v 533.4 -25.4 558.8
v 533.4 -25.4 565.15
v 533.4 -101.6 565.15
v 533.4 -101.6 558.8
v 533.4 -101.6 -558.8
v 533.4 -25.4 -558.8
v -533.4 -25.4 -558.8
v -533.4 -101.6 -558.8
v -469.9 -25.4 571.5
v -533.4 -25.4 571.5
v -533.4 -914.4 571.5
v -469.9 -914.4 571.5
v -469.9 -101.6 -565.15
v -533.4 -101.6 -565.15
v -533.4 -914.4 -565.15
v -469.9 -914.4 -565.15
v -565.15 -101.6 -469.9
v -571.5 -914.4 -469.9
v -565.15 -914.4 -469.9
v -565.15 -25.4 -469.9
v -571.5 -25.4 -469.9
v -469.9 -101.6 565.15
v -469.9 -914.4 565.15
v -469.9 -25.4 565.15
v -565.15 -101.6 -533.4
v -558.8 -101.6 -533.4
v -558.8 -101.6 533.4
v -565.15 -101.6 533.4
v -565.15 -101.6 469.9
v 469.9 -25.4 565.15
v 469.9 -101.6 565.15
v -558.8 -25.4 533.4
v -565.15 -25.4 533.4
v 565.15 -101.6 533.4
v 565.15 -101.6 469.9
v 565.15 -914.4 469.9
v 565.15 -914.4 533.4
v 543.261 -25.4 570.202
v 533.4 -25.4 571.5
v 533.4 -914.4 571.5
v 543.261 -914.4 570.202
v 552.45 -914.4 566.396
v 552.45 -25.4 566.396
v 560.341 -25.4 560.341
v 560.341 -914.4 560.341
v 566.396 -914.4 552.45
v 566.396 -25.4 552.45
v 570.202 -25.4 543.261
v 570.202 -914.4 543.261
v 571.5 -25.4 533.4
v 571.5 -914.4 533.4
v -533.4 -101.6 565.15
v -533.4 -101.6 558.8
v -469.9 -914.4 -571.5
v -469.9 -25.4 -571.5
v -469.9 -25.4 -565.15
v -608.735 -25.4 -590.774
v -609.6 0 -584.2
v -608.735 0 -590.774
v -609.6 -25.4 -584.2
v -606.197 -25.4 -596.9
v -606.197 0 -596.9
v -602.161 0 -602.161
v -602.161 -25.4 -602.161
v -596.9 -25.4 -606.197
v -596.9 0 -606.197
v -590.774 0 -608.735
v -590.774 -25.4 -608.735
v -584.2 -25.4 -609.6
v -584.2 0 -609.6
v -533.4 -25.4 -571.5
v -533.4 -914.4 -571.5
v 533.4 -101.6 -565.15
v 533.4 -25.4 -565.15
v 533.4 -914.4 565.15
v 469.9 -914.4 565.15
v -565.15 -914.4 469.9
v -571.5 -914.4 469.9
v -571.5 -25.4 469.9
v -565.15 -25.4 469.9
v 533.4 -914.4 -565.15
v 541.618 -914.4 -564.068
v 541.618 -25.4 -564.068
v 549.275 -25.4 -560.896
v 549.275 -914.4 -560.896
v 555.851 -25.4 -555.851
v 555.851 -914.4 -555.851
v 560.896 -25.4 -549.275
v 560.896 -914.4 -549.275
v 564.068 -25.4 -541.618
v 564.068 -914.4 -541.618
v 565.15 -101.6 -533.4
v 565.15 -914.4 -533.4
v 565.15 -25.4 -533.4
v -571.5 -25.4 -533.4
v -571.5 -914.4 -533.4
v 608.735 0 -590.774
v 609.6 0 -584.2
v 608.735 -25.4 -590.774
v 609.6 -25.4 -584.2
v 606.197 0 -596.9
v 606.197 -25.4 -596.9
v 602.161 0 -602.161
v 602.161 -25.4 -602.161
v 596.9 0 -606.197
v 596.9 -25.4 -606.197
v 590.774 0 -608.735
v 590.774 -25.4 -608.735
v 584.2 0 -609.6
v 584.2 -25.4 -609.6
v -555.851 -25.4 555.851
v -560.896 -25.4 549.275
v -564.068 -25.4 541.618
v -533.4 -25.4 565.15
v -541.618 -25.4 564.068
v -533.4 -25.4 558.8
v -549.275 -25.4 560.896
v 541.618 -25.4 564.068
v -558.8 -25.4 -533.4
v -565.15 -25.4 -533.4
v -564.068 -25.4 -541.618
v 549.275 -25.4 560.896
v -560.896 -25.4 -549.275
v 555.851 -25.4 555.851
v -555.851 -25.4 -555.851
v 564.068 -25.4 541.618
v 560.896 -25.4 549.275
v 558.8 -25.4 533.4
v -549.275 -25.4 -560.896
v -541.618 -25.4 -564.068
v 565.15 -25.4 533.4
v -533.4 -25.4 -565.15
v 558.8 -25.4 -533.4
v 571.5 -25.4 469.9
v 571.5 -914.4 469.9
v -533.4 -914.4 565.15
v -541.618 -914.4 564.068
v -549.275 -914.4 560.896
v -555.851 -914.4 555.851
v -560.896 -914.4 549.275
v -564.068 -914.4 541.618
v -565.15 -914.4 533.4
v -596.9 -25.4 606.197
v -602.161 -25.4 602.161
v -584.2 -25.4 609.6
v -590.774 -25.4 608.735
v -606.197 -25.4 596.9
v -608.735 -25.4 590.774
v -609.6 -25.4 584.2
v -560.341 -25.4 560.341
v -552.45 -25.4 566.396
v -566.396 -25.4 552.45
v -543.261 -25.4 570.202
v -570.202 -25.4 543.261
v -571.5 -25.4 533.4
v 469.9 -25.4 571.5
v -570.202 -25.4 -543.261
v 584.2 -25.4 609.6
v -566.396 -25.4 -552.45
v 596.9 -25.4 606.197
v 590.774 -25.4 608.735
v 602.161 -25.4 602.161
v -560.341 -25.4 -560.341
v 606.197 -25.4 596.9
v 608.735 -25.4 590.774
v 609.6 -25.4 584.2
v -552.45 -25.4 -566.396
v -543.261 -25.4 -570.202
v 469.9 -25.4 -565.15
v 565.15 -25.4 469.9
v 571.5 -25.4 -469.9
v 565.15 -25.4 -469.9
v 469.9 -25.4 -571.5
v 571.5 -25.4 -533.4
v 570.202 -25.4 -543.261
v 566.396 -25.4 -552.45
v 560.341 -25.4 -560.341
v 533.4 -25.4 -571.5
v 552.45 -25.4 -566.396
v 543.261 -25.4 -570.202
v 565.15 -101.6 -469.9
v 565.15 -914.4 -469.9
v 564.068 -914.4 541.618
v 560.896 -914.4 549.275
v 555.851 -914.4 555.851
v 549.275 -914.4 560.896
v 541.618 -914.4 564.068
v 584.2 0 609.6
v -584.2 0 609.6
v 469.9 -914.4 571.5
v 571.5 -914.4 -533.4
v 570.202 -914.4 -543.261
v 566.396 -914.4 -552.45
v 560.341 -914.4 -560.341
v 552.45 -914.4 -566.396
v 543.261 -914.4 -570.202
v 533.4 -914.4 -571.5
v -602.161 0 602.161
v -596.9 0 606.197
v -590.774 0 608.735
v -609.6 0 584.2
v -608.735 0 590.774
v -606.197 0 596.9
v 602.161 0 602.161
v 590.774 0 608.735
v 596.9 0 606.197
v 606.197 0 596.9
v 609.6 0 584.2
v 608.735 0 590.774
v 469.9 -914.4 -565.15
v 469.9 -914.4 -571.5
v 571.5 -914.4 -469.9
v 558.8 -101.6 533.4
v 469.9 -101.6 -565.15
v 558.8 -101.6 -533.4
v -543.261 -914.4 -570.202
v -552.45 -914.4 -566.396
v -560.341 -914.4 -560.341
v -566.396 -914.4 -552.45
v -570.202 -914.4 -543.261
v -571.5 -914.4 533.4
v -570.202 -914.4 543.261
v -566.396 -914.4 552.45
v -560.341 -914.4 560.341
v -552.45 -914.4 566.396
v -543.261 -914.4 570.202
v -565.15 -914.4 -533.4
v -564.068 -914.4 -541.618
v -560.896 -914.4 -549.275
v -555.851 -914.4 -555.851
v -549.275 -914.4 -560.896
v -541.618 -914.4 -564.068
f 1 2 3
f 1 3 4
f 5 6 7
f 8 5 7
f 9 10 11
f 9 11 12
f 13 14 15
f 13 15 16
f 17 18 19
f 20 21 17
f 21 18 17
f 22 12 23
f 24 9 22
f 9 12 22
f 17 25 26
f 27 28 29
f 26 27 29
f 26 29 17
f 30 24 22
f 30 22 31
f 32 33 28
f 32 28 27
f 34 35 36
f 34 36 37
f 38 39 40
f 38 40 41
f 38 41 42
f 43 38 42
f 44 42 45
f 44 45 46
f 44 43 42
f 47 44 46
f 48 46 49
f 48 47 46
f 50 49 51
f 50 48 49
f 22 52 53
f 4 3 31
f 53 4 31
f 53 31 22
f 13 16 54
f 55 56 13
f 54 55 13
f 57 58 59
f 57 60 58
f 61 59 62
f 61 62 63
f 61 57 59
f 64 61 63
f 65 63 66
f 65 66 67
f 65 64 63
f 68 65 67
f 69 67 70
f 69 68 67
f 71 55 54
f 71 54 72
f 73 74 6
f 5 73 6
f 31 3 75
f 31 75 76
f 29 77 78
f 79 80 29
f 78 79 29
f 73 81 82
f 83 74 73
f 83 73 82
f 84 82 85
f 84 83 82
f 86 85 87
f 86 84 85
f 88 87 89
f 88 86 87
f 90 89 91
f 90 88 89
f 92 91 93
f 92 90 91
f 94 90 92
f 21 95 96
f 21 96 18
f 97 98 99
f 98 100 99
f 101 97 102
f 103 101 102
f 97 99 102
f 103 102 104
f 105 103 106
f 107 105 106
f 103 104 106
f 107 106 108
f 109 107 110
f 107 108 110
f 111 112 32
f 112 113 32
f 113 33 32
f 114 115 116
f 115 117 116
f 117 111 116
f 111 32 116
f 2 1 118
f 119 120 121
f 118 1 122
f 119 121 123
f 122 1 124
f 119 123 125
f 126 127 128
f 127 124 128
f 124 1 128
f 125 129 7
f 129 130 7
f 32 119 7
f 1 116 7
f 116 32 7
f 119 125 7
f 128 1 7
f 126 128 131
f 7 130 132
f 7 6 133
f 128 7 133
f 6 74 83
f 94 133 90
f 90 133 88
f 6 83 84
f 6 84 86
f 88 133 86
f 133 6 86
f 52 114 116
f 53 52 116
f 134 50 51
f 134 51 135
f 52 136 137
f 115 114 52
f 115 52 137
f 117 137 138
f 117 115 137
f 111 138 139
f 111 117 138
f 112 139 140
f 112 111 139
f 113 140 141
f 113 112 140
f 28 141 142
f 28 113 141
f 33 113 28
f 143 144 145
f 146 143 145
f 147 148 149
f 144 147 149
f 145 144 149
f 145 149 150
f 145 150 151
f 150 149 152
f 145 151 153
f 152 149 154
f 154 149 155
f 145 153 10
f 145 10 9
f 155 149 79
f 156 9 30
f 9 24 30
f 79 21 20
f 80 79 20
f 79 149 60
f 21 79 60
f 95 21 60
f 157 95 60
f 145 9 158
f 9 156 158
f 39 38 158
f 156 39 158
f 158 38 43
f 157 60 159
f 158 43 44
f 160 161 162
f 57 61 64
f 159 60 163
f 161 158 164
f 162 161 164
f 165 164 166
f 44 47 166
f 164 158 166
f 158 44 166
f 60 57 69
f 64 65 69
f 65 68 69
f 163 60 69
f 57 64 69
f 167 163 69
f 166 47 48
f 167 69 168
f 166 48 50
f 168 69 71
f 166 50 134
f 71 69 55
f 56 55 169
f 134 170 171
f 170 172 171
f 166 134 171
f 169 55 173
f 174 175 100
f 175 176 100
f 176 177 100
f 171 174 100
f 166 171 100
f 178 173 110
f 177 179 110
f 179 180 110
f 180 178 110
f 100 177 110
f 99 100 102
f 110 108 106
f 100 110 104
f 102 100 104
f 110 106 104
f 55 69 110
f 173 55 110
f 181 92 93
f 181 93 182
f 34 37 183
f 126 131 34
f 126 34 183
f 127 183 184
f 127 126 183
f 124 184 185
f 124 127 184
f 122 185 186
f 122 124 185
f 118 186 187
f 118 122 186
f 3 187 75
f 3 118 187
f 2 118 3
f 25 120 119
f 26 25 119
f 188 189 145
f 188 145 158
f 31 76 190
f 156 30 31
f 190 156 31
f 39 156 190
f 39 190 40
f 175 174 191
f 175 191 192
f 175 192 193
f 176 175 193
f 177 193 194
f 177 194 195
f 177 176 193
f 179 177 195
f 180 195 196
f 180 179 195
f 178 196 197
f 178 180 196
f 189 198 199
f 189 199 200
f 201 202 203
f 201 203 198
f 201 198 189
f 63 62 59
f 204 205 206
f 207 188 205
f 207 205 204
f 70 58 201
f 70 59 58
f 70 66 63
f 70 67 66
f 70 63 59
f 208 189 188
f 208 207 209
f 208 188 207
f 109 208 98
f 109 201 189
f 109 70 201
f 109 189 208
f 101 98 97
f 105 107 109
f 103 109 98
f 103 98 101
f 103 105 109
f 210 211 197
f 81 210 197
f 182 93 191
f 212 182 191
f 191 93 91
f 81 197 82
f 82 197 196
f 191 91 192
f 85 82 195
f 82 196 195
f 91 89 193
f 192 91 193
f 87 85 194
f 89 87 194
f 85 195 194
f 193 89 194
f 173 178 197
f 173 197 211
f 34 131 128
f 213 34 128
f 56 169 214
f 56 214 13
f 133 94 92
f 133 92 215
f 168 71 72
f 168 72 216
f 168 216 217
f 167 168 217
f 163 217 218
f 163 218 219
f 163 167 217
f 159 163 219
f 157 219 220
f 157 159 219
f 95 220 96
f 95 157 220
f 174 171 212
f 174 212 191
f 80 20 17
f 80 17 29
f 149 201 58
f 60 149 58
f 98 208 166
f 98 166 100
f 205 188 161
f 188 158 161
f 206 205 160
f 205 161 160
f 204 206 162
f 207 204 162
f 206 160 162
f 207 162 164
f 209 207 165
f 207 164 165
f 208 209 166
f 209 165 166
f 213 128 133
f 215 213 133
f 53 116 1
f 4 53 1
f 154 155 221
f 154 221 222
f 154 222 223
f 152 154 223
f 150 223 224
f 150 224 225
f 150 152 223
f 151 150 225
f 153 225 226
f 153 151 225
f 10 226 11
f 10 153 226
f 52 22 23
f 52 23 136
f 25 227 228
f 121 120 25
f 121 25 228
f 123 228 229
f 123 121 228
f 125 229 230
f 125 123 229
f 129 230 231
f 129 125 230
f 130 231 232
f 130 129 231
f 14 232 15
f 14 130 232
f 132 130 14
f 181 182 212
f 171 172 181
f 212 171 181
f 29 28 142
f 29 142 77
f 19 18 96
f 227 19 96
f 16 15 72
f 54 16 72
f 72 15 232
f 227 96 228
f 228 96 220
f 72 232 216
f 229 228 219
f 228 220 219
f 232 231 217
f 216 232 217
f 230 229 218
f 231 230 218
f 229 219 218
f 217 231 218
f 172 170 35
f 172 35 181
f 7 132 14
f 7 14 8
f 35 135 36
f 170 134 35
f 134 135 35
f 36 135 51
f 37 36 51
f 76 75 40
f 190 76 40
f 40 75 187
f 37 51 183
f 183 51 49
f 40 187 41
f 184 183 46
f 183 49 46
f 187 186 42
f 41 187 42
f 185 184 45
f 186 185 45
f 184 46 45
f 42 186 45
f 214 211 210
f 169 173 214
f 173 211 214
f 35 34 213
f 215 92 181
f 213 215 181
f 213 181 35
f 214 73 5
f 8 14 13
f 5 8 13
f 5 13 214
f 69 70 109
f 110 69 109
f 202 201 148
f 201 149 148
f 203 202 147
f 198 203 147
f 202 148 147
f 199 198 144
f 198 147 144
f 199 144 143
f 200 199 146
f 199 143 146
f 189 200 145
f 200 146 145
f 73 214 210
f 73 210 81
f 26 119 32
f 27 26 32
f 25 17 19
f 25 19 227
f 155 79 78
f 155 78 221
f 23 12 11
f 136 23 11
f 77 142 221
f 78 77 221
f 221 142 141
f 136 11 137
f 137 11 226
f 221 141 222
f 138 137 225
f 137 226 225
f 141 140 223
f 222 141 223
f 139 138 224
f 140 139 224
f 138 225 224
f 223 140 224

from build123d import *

# Parameters (mm, degrees)
SKETCH1_W         = 1219.2
SKETCH1_H         = 1219.2
EXTRUDE1_DEPTH    = 25.4
FILLET1_R         = 25.4
EXTRUDE2_DEPTH    = 889
SKETCH3_W         = 6.35
SKETCH3_H         = 1066.8
EXTRUDE3_DEPTH    = 76.2
CIRPATTERN1_COUNT = 4


with BuildPart() as part:
    # Sketch1 → Extrude1 (new body)
    with BuildSketch(Plane(origin=(0, 0, 0), x_dir=(1, 0, 0), z_dir=(0, 1, 0))):
        Rectangle(SKETCH1_W, SKETCH1_H)
    extrude(amount=-EXTRUDE1_DEPTH)

    # Fillet1
    fillet1_edges = [part.edges().sort_by_distance(p)[0] for p in [
        (-609.6, -12.7, 609.6),
        (609.6, -12.7, -609.6),
        (-609.6, -12.7, -609.6),
        (609.6, -12.7, 609.6),
    ]]
    fillet(fillet1_edges, radius=FILLET1_R)

    # Sketch2 → Extrude2 (add)
    with BuildSketch(Plane.XZ.offset(25.4)):
        with BuildLine():
            Line((-469.9, 571.5), (-469.9, 565.15))
            Line((-469.9, 565.15), (-533.4, 565.15))
            ThreePointArc((-533.4, 565.15), (-555.850640303, 555.850640303), (-565.15, 533.4))
            Line((-565.15, 533.4), (-565.15, 469.9))
            Line((-565.15, 469.9), (-571.5, 469.9))
            Line((-571.5, 469.9), (-571.5, 533.4))
            ThreePointArc((-571.5, 533.4), (-560.340768363, 560.340768363), (-533.4, 571.5))
            Line((-533.4, 571.5), (-469.9, 571.5))
        make_face()
    extrude2 = extrude(amount=EXTRUDE2_DEPTH)

    # Sketch3 → Extrude3 (add)
    with BuildSketch(Plane.XZ.offset(25.4)):
        with Locations((-561.975, 0)):
            Rectangle(SKETCH3_W, SKETCH3_H)
    extrude3 = extrude(amount=EXTRUDE3_DEPTH)

    # CirPattern1: Extrude2, Extrude3 ×4 about axis
    cirpattern1_axis = Axis((0, 0, 0), (0, -1, 0))
    add([extrude2.rotate(cirpattern1_axis, i * 360 / CIRPATTERN1_COUNT) for i in range(1, CIRPATTERN1_COUNT)])
    add([extrude3.rotate(cirpattern1_axis, i * 360 / CIRPATTERN1_COUNT) for i in range(1, CIRPATTERN1_COUNT)])


solid = part.part
